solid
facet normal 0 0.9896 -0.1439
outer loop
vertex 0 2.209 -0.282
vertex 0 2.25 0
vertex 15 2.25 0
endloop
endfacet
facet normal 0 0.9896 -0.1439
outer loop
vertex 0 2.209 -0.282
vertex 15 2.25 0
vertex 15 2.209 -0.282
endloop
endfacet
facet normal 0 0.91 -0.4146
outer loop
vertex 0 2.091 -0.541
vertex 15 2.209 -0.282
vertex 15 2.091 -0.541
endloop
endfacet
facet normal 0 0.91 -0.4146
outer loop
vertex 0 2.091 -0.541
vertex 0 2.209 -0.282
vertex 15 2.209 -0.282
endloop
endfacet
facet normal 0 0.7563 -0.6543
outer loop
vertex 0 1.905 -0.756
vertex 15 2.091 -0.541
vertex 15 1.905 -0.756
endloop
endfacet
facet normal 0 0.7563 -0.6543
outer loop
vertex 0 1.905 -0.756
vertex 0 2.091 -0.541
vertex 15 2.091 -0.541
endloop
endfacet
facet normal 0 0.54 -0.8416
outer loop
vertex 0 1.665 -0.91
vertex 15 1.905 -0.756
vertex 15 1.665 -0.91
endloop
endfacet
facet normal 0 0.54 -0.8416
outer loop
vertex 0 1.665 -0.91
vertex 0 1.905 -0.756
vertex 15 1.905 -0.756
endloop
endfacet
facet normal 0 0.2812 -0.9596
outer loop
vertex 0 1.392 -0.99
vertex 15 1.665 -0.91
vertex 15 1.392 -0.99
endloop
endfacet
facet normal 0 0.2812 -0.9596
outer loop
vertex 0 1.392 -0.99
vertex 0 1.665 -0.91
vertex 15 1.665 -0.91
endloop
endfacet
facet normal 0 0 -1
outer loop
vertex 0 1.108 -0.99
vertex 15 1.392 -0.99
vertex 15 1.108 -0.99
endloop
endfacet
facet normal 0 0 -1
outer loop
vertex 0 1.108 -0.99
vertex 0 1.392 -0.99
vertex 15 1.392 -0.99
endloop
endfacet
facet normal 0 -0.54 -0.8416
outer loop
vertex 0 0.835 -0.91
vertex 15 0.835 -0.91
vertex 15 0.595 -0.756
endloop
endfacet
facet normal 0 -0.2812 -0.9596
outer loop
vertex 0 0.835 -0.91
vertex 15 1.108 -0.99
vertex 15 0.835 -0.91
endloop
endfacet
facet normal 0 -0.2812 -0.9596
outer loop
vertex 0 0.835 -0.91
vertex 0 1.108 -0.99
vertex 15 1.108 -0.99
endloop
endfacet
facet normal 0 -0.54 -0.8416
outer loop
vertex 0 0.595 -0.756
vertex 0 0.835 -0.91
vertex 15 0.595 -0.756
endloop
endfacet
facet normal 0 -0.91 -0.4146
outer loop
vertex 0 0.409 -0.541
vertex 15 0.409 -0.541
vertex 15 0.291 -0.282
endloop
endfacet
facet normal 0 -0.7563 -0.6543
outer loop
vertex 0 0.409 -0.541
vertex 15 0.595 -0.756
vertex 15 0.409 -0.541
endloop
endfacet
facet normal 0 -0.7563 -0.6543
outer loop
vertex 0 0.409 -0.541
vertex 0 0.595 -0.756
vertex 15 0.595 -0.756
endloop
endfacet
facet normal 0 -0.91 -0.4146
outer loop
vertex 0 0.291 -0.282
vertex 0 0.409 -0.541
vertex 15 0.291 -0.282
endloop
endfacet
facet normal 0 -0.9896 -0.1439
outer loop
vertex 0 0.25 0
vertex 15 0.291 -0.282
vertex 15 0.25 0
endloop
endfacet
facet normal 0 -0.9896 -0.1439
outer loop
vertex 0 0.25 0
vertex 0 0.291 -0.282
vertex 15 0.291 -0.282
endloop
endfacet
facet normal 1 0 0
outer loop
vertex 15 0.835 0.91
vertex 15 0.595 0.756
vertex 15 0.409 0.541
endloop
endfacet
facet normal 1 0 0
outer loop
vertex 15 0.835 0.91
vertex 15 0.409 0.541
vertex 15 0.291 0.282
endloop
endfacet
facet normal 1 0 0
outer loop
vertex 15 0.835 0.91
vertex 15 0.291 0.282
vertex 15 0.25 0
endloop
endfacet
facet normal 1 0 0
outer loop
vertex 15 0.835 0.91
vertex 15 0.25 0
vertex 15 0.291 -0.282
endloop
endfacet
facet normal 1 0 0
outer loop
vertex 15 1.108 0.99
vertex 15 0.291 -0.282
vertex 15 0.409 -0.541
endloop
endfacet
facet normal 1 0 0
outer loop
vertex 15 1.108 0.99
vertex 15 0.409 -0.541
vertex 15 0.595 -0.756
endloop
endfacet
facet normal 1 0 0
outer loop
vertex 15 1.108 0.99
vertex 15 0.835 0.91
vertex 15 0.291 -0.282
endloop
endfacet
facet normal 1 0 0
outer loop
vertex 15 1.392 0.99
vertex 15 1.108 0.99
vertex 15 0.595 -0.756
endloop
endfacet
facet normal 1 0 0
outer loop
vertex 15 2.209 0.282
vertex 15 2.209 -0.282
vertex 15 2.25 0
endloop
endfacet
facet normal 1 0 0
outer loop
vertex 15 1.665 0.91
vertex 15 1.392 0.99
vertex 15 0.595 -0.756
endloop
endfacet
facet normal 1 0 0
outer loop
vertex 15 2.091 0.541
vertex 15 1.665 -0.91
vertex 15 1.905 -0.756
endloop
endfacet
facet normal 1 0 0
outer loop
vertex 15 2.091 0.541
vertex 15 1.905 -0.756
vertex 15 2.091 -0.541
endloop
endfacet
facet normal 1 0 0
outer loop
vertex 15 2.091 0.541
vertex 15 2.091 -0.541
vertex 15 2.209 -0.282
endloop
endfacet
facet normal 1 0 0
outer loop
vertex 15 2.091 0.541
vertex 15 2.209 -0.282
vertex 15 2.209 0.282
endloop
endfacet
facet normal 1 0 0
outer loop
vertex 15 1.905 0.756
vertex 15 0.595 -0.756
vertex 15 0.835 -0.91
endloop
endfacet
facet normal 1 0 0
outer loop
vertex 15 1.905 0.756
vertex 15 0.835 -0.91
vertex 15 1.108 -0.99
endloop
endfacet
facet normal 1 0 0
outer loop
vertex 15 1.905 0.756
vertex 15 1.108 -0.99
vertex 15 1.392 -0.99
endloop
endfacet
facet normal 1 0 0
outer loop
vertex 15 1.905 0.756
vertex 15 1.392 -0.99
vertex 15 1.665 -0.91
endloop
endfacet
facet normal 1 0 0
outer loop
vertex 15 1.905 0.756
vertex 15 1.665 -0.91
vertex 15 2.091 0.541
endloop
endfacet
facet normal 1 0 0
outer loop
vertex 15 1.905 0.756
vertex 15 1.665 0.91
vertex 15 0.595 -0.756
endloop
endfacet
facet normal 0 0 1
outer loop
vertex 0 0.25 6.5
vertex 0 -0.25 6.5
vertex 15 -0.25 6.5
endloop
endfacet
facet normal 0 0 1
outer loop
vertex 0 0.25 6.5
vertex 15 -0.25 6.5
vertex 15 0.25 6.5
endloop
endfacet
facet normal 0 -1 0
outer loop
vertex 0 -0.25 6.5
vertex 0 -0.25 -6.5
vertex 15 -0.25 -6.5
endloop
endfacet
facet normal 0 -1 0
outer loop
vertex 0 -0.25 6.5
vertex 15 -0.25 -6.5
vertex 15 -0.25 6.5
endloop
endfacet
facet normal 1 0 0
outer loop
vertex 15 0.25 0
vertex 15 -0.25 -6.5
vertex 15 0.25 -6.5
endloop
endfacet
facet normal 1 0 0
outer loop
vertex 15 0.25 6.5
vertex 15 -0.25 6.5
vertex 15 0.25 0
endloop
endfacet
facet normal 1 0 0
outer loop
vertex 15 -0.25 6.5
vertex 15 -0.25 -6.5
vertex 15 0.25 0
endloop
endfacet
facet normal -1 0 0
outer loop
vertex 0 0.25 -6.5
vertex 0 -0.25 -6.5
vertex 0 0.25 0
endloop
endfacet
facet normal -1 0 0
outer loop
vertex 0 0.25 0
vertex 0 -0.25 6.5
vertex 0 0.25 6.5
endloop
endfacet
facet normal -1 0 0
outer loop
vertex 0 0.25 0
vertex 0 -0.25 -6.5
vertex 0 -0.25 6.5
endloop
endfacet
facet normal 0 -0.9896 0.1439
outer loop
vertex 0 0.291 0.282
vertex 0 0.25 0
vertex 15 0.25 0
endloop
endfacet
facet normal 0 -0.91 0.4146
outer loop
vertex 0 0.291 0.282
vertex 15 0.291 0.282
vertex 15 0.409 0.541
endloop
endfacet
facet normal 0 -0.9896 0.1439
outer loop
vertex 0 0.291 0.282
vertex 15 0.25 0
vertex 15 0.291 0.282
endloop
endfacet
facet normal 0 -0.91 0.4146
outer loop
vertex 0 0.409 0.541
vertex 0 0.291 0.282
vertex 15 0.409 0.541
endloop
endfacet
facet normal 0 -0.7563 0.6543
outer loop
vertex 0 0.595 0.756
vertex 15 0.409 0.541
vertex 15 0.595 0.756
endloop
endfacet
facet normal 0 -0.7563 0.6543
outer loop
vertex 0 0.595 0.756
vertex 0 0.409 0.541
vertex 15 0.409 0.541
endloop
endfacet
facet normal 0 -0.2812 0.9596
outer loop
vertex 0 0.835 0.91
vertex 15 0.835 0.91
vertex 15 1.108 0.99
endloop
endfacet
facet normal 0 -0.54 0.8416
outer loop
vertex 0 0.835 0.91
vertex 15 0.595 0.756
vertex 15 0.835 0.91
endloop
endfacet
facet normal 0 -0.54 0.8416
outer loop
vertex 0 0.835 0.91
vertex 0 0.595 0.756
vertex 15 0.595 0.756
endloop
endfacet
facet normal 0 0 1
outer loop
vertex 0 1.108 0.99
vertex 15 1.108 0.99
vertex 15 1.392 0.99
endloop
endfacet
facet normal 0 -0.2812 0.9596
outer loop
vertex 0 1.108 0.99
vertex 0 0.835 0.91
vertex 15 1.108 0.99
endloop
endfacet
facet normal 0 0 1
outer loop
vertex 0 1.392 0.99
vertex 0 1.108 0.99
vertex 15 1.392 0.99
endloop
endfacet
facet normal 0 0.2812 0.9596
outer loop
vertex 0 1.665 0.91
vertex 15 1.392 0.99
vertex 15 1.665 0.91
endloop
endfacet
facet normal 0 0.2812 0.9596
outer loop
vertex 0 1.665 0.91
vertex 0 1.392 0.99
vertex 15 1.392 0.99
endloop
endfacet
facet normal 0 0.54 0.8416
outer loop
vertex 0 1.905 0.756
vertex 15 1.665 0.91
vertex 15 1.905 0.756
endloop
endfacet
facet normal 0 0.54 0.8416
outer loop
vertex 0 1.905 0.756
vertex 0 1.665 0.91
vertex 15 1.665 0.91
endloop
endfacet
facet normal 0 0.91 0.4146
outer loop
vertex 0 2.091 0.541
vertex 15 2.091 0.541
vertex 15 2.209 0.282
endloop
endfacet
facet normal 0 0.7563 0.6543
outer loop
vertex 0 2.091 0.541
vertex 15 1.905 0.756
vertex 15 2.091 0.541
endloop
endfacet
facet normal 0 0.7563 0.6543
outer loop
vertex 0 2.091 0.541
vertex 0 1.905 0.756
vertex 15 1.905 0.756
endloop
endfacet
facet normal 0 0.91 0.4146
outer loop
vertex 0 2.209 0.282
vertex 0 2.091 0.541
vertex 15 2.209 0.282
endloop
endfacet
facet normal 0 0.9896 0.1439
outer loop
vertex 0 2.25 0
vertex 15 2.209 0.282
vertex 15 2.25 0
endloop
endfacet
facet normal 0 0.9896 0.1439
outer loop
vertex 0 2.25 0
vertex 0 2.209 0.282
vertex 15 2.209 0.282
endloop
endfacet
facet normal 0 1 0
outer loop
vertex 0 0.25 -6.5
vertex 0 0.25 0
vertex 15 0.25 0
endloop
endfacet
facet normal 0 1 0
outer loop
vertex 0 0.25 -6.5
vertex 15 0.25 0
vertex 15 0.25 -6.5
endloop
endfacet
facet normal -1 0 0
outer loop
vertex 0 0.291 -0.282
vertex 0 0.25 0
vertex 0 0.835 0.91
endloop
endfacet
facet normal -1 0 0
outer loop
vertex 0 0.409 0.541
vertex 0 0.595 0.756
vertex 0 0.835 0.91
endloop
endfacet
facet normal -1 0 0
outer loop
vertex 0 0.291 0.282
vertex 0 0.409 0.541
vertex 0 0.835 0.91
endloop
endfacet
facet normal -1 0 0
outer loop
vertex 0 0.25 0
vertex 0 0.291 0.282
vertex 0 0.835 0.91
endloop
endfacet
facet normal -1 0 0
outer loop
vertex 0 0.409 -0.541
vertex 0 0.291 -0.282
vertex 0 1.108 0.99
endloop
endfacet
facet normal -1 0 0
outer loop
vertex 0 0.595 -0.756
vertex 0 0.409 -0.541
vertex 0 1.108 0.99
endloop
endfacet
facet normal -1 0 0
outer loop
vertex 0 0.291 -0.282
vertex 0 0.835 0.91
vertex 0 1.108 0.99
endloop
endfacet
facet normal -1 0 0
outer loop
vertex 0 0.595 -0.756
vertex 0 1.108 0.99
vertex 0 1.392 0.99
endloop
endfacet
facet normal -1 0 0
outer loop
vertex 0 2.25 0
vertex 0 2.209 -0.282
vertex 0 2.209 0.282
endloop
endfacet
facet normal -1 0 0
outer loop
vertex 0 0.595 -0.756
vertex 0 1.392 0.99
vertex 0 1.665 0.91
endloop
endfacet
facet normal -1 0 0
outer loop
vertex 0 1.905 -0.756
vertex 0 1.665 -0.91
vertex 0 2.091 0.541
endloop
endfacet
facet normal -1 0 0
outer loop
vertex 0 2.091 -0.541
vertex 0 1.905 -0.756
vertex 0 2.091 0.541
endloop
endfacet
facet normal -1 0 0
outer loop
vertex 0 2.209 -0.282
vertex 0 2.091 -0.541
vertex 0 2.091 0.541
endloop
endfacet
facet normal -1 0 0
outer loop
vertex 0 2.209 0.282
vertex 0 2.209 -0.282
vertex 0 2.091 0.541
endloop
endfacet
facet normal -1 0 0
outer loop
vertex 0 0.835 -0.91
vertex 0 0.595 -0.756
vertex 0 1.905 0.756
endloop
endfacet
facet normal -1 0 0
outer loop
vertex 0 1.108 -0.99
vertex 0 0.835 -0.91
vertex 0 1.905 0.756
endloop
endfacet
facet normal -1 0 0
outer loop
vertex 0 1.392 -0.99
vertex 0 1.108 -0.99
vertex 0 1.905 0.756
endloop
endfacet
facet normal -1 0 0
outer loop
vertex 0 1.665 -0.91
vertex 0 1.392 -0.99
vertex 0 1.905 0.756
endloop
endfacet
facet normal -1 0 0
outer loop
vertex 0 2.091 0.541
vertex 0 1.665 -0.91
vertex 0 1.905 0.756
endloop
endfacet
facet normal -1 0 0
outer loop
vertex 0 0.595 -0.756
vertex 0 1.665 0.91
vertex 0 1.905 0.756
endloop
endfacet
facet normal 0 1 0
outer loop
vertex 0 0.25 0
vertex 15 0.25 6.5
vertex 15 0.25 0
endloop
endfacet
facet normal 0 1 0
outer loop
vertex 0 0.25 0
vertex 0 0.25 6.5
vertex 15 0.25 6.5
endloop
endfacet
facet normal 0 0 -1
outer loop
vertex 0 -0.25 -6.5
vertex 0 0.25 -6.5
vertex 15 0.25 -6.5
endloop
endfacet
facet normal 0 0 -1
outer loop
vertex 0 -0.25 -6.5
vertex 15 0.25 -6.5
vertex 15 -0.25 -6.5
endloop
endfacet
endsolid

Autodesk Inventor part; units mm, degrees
ref_plane "YZ Plane" through (0, 0, 0) normal (1, 0, 0) x (0, 1, 0)
ref_plane "XZ Plane" through (0, 0, 0) normal (0, 1, 0) x (-1, 0, 0)
ref_plane "XY Plane" through (0, 0, 0) normal (0, 0, 1) x (1, 0, 0)
sketch "Sketch1" plane through (0, 0, 0) normal (1, 0, 0) x (0, 1, 0)
  line L0 (-0.25, 6.5) -> (0.25, 6.5)
  line L1 (0.25, 6.5) -> (0.25, -6.5)
  line L2 (0.25, -6.5) -> (-0.25, -6.5)
  line L3 (-0.25, -6.5) -> (-0.25, 6.5)
  line L4 (-0.25, 6.5) -> (0.25, -6.5) construction
  line L5 (0.25, 6.5) -> (-0.25, -6.5) construction
  circle A0 centre (1.25, 0) radius 1
  point P0 (0, 0)
  point P1 (0, 0)
  dimension "d0" = 0.5
  dimension "d1" = 13
  dimension "d2" = 2
extrude "Extrusion1" add sketch "Sketch1" along normal blind 15
properties part number "hinge" material "Stainless Steel"
